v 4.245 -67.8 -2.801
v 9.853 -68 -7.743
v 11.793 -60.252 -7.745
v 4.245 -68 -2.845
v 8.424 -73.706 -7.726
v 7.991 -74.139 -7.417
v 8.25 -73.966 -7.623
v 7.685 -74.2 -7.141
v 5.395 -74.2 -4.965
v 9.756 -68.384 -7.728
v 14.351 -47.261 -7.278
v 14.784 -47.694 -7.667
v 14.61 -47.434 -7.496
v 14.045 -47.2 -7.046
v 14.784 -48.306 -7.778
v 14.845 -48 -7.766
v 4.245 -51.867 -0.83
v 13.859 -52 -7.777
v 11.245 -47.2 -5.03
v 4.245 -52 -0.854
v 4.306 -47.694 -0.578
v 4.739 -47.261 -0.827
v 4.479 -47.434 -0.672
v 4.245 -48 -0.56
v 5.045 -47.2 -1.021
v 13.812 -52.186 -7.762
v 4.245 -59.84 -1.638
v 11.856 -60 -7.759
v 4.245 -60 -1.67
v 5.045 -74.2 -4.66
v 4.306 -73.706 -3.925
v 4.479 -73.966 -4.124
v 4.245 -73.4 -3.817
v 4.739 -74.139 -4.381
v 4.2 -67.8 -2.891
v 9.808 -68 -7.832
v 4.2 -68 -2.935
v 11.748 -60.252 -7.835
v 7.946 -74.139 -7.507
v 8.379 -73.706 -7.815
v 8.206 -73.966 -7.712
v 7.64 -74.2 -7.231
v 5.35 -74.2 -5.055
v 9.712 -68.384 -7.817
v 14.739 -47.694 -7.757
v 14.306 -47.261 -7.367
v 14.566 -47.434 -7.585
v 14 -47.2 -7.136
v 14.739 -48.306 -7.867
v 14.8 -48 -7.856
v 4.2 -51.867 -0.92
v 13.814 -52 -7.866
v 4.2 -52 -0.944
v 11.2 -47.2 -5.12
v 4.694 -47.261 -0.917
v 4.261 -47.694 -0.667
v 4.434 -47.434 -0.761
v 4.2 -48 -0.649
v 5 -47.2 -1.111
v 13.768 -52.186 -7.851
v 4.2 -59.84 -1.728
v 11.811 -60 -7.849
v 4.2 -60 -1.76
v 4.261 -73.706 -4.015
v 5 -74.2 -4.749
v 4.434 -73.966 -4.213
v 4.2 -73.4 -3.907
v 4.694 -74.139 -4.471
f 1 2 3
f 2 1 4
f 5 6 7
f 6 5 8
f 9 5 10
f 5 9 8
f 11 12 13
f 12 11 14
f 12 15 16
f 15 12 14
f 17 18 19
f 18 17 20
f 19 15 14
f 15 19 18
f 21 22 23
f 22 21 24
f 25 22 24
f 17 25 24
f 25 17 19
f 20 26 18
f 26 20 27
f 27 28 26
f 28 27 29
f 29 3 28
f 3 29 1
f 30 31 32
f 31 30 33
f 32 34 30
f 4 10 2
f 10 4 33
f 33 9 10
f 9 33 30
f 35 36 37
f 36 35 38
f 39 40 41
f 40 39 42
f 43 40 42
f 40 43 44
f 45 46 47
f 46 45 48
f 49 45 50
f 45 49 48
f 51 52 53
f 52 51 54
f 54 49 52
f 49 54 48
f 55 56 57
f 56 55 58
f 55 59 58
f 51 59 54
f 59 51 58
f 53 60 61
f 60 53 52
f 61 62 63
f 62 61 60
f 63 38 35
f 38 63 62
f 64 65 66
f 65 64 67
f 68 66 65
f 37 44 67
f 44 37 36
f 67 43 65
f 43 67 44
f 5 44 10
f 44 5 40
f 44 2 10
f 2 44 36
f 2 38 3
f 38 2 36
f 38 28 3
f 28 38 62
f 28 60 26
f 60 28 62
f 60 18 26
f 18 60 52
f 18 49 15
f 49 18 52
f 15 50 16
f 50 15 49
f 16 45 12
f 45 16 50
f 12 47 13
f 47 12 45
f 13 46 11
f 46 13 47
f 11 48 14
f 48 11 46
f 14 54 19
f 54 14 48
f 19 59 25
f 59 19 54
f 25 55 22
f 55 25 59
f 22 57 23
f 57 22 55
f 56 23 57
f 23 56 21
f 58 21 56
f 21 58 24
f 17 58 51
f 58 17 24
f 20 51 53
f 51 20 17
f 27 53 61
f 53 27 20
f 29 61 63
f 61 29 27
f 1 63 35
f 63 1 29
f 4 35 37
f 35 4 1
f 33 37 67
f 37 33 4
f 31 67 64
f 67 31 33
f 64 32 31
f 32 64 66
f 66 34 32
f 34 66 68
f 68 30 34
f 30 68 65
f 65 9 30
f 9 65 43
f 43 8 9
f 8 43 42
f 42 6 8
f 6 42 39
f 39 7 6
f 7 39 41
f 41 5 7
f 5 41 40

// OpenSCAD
use <../lib.scad>
function ldraw_lib__4221407dc01() = [
// 0 Sticker  1.5 x  3.3 Trapezoid Yellow Left (Formed)
// 0 Name: 4221407dc01.dat
// 0 Author: Evert-Jan Boer [ejboer]
// 0 !LDRAW_ORG Part UPDATE 2024-08
// 0 !LICENSE Licensed under CC BY 4.0 : see CAreadme.txt
// 
// 0 BFC CERTIFY CCW
  [0,"BFC","CERTIFY"],
  [0,"BFC","CCW"],
// 
// 0 !KEYWORDS Set 10134, Star Wars, Y-Wing Starfighter
// 
// 0 !HISTORY 2024-09-30 [OrionP] Official Update 2024-08
// 
// 
// 4 14 10.612 7.1127 -170 24.6318 19.3566 -170 29.4819 19.3633 -150.6301 10.612 7.0035 -169.5
  [4,14,10.612,7.1127,-170,24.6318,19.3566,-170,29.4819,19.3633,-150.6301,10.612,7.0035,-169.5],
// 4 14 19.212 17.8523 -185.5 19.9774 18.5432 -185.3478 20.6262 19.0566 -184.9142 21.0598 19.3144 -184.2654
  [4,14,19.212,17.8523,-185.5,19.9774,18.5432,-185.3478,20.6262,19.0566,-184.9142,21.0598,19.3144,-184.2654],
// 4 14 21.0598 19.3144 -184.2654 24.3911 19.3194 -170.9612 13.487 12.4135 -185.5 19.212 17.8523 -185.5
  [4,14,21.0598,19.3144,-184.2654,24.3911,19.3194,-170.9612,13.487,12.4135,-185.5,19.212,17.8523,-185.5],
// 4 14 36.9598 19.1686 -119.2346 36.5262 18.7397 -118.5858 35.8774 18.1945 -118.1522 35.112 17.616 -118
  [4,14,36.9598,19.1686,-119.2346,36.5262,18.7397,-118.5858,35.8774,18.1945,-118.1522,35.112,17.616,-118],
// 4 14 36.9598 19.1686 -119.2346 35.112 17.616 -118 36.9598 19.4442 -120.7654 37.112 19.416 -120
  [4,14,36.9598,19.1686,-119.2346,35.112,17.616,-118,36.9598,19.4442,-120.7654,37.112,19.416,-120],
// 4 14 34.6475 19.4416 -130 28.112 12.576 -118 10.612 2.076 -129.6667 10.612 2.136 -130
  [4,14,34.6475,19.4416,-130,28.112,12.576,-118,10.612,2.076,-129.6667,10.612,2.136,-130],
// 4 14 36.9598 19.4442 -120.7654 35.112 17.616 -118 28.112 12.576 -118 34.6475 19.4416 -130
  [4,14,36.9598,19.4442,-120.7654,35.112,17.616,-118,28.112,12.576,-118,34.6475,19.4416,-130],
// 4 14 10.7642 1.4442 -119.2346 10.612 1.3993 -120 11.8466 2.0684 -118.1522 11.1978 1.6792 -118.5858
  [4,14,10.7642,1.4442,-119.2346,10.612,1.3993,-120,11.8466,2.0684,-118.1522,11.1978,1.6792,-118.5858],
// 3 14 12.612 2.5527 -118 11.8466 2.0684 -118.1522 10.612 1.3993 -120
  [3,14,12.612,2.5527,-118,11.8466,2.0684,-118.1522,10.612,1.3993,-120],
// 4 14 10.612 1.3993 -120 10.612 2.076 -129.6667 28.112 12.576 -118 12.612 2.5527 -118
  [4,14,10.612,1.3993,-120,10.612,2.076,-129.6667,28.112,12.576,-118,12.612,2.5527,-118],
// 4 14 10.612 4.096 -149.6 34.5312 19.4043 -130.4647 34.6475 19.4416 -130 10.612 2.136 -130
  [4,14,10.612,4.096,-149.6,34.5312,19.4043,-130.4647,34.6475,19.4416,-130,10.612,2.136,-130],
// 4 14 10.612 4.176 -150 29.6396 19.3981 -150 34.5312 19.4043 -130.4647 10.612 4.096 -149.6
  [4,14,10.612,4.176,-150,29.6396,19.3981,-150,34.5312,19.4043,-130.4647,10.612,4.096,-149.6],
// 4 14 10.612 7.0035 -169.5 29.4819 19.3633 -150.6301 29.6396 19.3981 -150 10.612 4.176 -150
  [4,14,10.612,7.0035,-169.5,29.4819,19.3633,-150.6301,29.6396,19.3981,-150,10.612,4.176,-150],
// 4 14 12.612 11.6493 -185.5 10.612 9.5427 -183.5 10.7642 9.8134 -184.2654 11.1978 10.3088 -184.9142
  [4,14,12.612,11.6493,-185.5,10.612,9.5427,-183.5,10.7642,9.8134,-184.2654,11.1978,10.3088,-184.9142],
// 3 14 11.1978 10.3088 -184.9142 11.8466 10.9535 -185.3478 12.612 11.6493 -185.5
  [3,14,11.1978,10.3088,-184.9142,11.8466,10.9535,-185.3478,12.612,11.6493,-185.5],
// 4 14 24.6318 19.3566 -170 10.612 7.1127 -170 10.612 9.5427 -183.5 24.3911 19.3194 -170.9612
  [4,14,24.6318,19.3566,-170,10.612,7.1127,-170,10.612,9.5427,-183.5,24.3911,19.3194,-170.9612],
// 4 14 13.487 12.4135 -185.5 24.3911 19.3194 -170.9612 10.612 9.5427 -183.5 12.612 11.6493 -185.5
  [4,14,13.487,12.4135,-185.5,24.3911,19.3194,-170.9612,10.612,9.5427,-183.5,12.612,11.6493,-185.5],
// 
// 4 16 29.3699 19.5873 -150.6301 24.5198 19.5806 -170 10.5 7.3367 -170 10.5 7.2275 -169.5
  [4,16,29.3699,19.5873,-150.6301,24.5198,19.5806,-170,10.5,7.3367,-170,10.5,7.2275,-169.5],
// 4 16 20.5142 19.2806 -184.9142 19.8654 18.7672 -185.3478 19.1 18.0763 -185.5 20.9478 19.5384 -184.2654
  [4,16,20.5142,19.2806,-184.9142,19.8654,18.7672,-185.3478,19.1,18.0763,-185.5,20.9478,19.5384,-184.2654],
// 4 16 13.375 12.6375 -185.5 24.2791 19.5434 -170.9612 20.9478 19.5384 -184.2654 19.1 18.0763 -185.5
  [4,16,13.375,12.6375,-185.5,24.2791,19.5434,-170.9612,20.9478,19.5384,-184.2654,19.1,18.0763,-185.5],
// 4 16 35.7654 18.4185 -118.1522 36.4142 18.9637 -118.5858 36.8478 19.3926 -119.2346 35 17.84 -118
  [4,16,35.7654,18.4185,-118.1522,36.4142,18.9637,-118.5858,36.8478,19.3926,-119.2346,35,17.84,-118],
// 4 16 36.8478 19.6682 -120.7654 35 17.84 -118 36.8478 19.3926 -119.2346 37 19.64 -120
  [4,16,36.8478,19.6682,-120.7654,35,17.84,-118,36.8478,19.3926,-119.2346,37,19.64,-120],
// 4 16 10.5 2.3 -129.6667 28 12.8 -118 34.5355 19.6656 -130 10.5 2.36 -130
  [4,16,10.5,2.3,-129.6667,28,12.8,-118,34.5355,19.6656,-130,10.5,2.36,-130],
// 4 16 28 12.8 -118 35 17.84 -118 36.8478 19.6682 -120.7654 34.5355 19.6656 -130
  [4,16,28,12.8,-118,35,17.84,-118,36.8478,19.6682,-120.7654,34.5355,19.6656,-130],
// 4 16 11.7346 2.2924 -118.1522 10.5 1.6233 -120 10.6522 1.6682 -119.2346 11.0858 1.9032 -118.5858
  [4,16,11.7346,2.2924,-118.1522,10.5,1.6233,-120,10.6522,1.6682,-119.2346,11.0858,1.9032,-118.5858],
// 3 16 11.7346 2.2924 -118.1522 12.5 2.7767 -118 10.5 1.6233 -120
  [3,16,11.7346,2.2924,-118.1522,12.5,2.7767,-118,10.5,1.6233,-120],
// 4 16 28 12.8 -118 10.5 2.3 -129.6667 10.5 1.6233 -120 12.5 2.7767 -118
  [4,16,28,12.8,-118,10.5,2.3,-129.6667,10.5,1.6233,-120,12.5,2.7767,-118],
// 4 16 34.5355 19.6656 -130 34.4192 19.6283 -130.4647 10.5 4.32 -149.6 10.5 2.36 -130
  [4,16,34.5355,19.6656,-130,34.4192,19.6283,-130.4647,10.5,4.32,-149.6,10.5,2.36,-130],
// 4 16 34.4192 19.6283 -130.4647 29.5276 19.6221 -150 10.5 4.4 -150 10.5 4.32 -149.6
  [4,16,34.4192,19.6283,-130.4647,29.5276,19.6221,-150,10.5,4.4,-150,10.5,4.32,-149.6],
// 4 16 29.5276 19.6221 -150 29.3699 19.5873 -150.6301 10.5 7.2275 -169.5 10.5 4.4 -150
  [4,16,29.5276,19.6221,-150,29.3699,19.5873,-150.6301,10.5,7.2275,-169.5,10.5,4.4,-150],
// 4 16 10.6522 10.0374 -184.2654 10.5 9.7667 -183.5 12.5 11.8733 -185.5 11.0858 10.5328 -184.9142
  [4,16,10.6522,10.0374,-184.2654,10.5,9.7667,-183.5,12.5,11.8733,-185.5,11.0858,10.5328,-184.9142],
// 3 16 11.7346 11.1775 -185.3478 11.0858 10.5328 -184.9142 12.5 11.8733 -185.5
  [3,16,11.7346,11.1775,-185.3478,11.0858,10.5328,-184.9142,12.5,11.8733,-185.5],
// 4 16 10.5 9.7667 -183.5 10.5 7.3367 -170 24.5198 19.5806 -170 24.2791 19.5434 -170.9612
  [4,16,10.5,9.7667,-183.5,10.5,7.3367,-170,24.5198,19.5806,-170,24.2791,19.5434,-170.9612],
// 4 16 10.5 9.7667 -183.5 24.2791 19.5434 -170.9612 13.375 12.6375 -185.5 12.5 11.8733 -185.5
  [4,16,10.5,9.7667,-183.5,24.2791,19.5434,-170.9612,13.375,12.6375,-185.5,12.5,11.8733,-185.5],
// 4 16 21.0598 19.3144 -184.2654 20.9478 19.5384 -184.2654 24.2791 19.5434 -170.9612 24.3911 19.3194 -170.9612
  [4,16,21.0598,19.3144,-184.2654,20.9478,19.5384,-184.2654,24.2791,19.5434,-170.9612,24.3911,19.3194,-170.9612],
// 4 16 24.3911 19.3194 -170.9612 24.2791 19.5434 -170.9612 24.5198 19.5806 -170 24.6318 19.3566 -170
  [4,16,24.3911,19.3194,-170.9612,24.2791,19.5434,-170.9612,24.5198,19.5806,-170,24.6318,19.3566,-170],
// 4 16 24.6318 19.3566 -170 24.5198 19.5806 -170 29.3699 19.5873 -150.6301 29.4819 19.3633 -150.6301
  [4,16,24.6318,19.3566,-170,24.5198,19.5806,-170,29.3699,19.5873,-150.6301,29.4819,19.3633,-150.6301],
// 4 16 29.4819 19.3633 -150.6301 29.3699 19.5873 -150.6301 29.5276 19.6221 -150 29.6396 19.3981 -150
  [4,16,29.4819,19.3633,-150.6301,29.3699,19.5873,-150.6301,29.5276,19.6221,-150,29.6396,19.3981,-150],
// 4 16 29.6396 19.3981 -150 29.5276 19.6221 -150 34.4192 19.6283 -130.4647 34.5312 19.4043 -130.4647
  [4,16,29.6396,19.3981,-150,29.5276,19.6221,-150,34.4192,19.6283,-130.4647,34.5312,19.4043,-130.4647],
// 4 16 34.5312 19.4043 -130.4647 34.4192 19.6283 -130.4647 34.5355 19.6656 -130 34.6475 19.4416 -130
  [4,16,34.5312,19.4043,-130.4647,34.4192,19.6283,-130.4647,34.5355,19.6656,-130,34.6475,19.4416,-130],
// 4 16 34.6475 19.4416 -130 34.5355 19.6656 -130 36.8478 19.6682 -120.7654 36.9598 19.4442 -120.7654
  [4,16,34.6475,19.4416,-130,34.5355,19.6656,-130,36.8478,19.6682,-120.7654,36.9598,19.4442,-120.7654],
// 4 16 36.9598 19.4442 -120.7654 36.8478 19.6682 -120.7654 37 19.64 -120 37.112 19.416 -120
  [4,16,36.9598,19.4442,-120.7654,36.8478,19.6682,-120.7654,37,19.64,-120,37.112,19.416,-120],
// 4 16 37 19.64 -120 36.8478 19.3926 -119.2346 36.9598 19.1686 -119.2346 37.112 19.416 -120
  [4,16,37,19.64,-120,36.8478,19.3926,-119.2346,36.9598,19.1686,-119.2346,37.112,19.416,-120],
// 4 16 36.8478 19.3926 -119.2346 36.4142 18.9637 -118.5858 36.5262 18.7397 -118.5858 36.9598 19.1686 -119.2346
  [4,16,36.8478,19.3926,-119.2346,36.4142,18.9637,-118.5858,36.5262,18.7397,-118.5858,36.9598,19.1686,-119.2346],
// 4 16 36.4142 18.9637 -118.5858 35.7654 18.4185 -118.1522 35.8774 18.1945 -118.1522 36.5262 18.7397 -118.5858
  [4,16,36.4142,18.9637,-118.5858,35.7654,18.4185,-118.1522,35.8774,18.1945,-118.1522,36.5262,18.7397,-118.5858],
// 4 16 35.7654 18.4185 -118.1522 35 17.84 -118 35.112 17.616 -118 35.8774 18.1945 -118.1522
  [4,16,35.7654,18.4185,-118.1522,35,17.84,-118,35.112,17.616,-118,35.8774,18.1945,-118.1522],
// 4 16 35 17.84 -118 28 12.8 -118 28.112 12.576 -118 35.112 17.616 -118
  [4,16,35,17.84,-118,28,12.8,-118,28.112,12.576,-118,35.112,17.616,-118],
// 4 16 28 12.8 -118 12.5 2.7767 -118 12.612 2.5527 -118 28.112 12.576 -118
  [4,16,28,12.8,-118,12.5,2.7767,-118,12.612,2.5527,-118,28.112,12.576,-118],
// 4 16 12.5 2.7767 -118 11.7346 2.2924 -118.1522 11.8466 2.0684 -118.1522 12.612 2.5527 -118
  [4,16,12.5,2.7767,-118,11.7346,2.2924,-118.1522,11.8466,2.0684,-118.1522,12.612,2.5527,-118],
// 4 16 11.7346 2.2924 -118.1522 11.0858 1.9032 -118.5858 11.1978 1.6792 -118.5858 11.8466 2.0684 -118.1522
  [4,16,11.7346,2.2924,-118.1522,11.0858,1.9032,-118.5858,11.1978,1.6792,-118.5858,11.8466,2.0684,-118.1522],
// 4 16 11.0858 1.9032 -118.5858 10.6522 1.6682 -119.2346 10.7642 1.4442 -119.2346 11.1978 1.6792 -118.5858
  [4,16,11.0858,1.9032,-118.5858,10.6522,1.6682,-119.2346,10.7642,1.4442,-119.2346,11.1978,1.6792,-118.5858],
// 4 16 10.6522 1.6682 -119.2346 10.5 1.6233 -120 10.612 1.3993 -120 10.7642 1.4442 -119.2346
  [4,16,10.6522,1.6682,-119.2346,10.5,1.6233,-120,10.612,1.3993,-120,10.7642,1.4442,-119.2346],
// 4 16 10.612 1.3993 -120 10.5 1.6233 -120 10.5 2.3 -129.6667 10.612 2.076 -129.6667
  [4,16,10.612,1.3993,-120,10.5,1.6233,-120,10.5,2.3,-129.6667,10.612,2.076,-129.6667],
// 4 16 10.612 2.076 -129.6667 10.5 2.3 -129.6667 10.5 2.36 -130 10.612 2.136 -130
  [4,16,10.612,2.076,-129.6667,10.5,2.3,-129.6667,10.5,2.36,-130,10.612,2.136,-130],
// 4 16 10.612 2.136 -130 10.5 2.36 -130 10.5 4.32 -149.6 10.612 4.096 -149.6
  [4,16,10.612,2.136,-130,10.5,2.36,-130,10.5,4.32,-149.6,10.612,4.096,-149.6],
// 4 16 10.612 4.096 -149.6 10.5 4.32 -149.6 10.5 4.4 -150 10.612 4.176 -150
  [4,16,10.612,4.096,-149.6,10.5,4.32,-149.6,10.5,4.4,-150,10.612,4.176,-150],
// 4 16 10.612 4.176 -150 10.5 4.4 -150 10.5 7.2275 -169.5 10.612 7.0035 -169.5
  [4,16,10.612,4.176,-150,10.5,4.4,-150,10.5,7.2275,-169.5,10.612,7.0035,-169.5],
// 4 16 10.612 7.0035 -169.5 10.5 7.2275 -169.5 10.5 7.3367 -170 10.612 7.1127 -170
  [4,16,10.612,7.0035,-169.5,10.5,7.2275,-169.5,10.5,7.3367,-170,10.612,7.1127,-170],
// 4 16 10.612 7.1127 -170 10.5 7.3367 -170 10.5 9.7667 -183.5 10.612 9.5427 -183.5
  [4,16,10.612,7.1127,-170,10.5,7.3367,-170,10.5,9.7667,-183.5,10.612,9.5427,-183.5],
// 4 16 10.612 9.5427 -183.5 10.5 9.7667 -183.5 10.6522 10.0374 -184.2654 10.7642 9.8134 -184.2654
  [4,16,10.612,9.5427,-183.5,10.5,9.7667,-183.5,10.6522,10.0374,-184.2654,10.7642,9.8134,-184.2654],
// 4 16 10.7642 9.8134 -184.2654 10.6522 10.0374 -184.2654 11.0858 10.5328 -184.9142 11.1978 10.3088 -184.9142
  [4,16,10.7642,9.8134,-184.2654,10.6522,10.0374,-184.2654,11.0858,10.5328,-184.9142,11.1978,10.3088,-184.9142],
// 4 16 11.1978 10.3088 -184.9142 11.0858 10.5328 -184.9142 11.7346 11.1775 -185.3478 11.8466 10.9535 -185.3478
  [4,16,11.1978,10.3088,-184.9142,11.0858,10.5328,-184.9142,11.7346,11.1775,-185.3478,11.8466,10.9535,-185.3478],
// 4 16 11.8466 10.9535 -185.3478 11.7346 11.1775 -185.3478 12.5 11.8733 -185.5 12.612 11.6493 -185.5
  [4,16,11.8466,10.9535,-185.3478,11.7346,11.1775,-185.3478,12.5,11.8733,-185.5,12.612,11.6493,-185.5],
// 4 16 12.612 11.6493 -185.5 12.5 11.8733 -185.5 13.375 12.6375 -185.5 13.487 12.4135 -185.5
  [4,16,12.612,11.6493,-185.5,12.5,11.8733,-185.5,13.375,12.6375,-185.5,13.487,12.4135,-185.5],
// 4 16 13.487 12.4135 -185.5 13.375 12.6375 -185.5 19.1 18.0763 -185.5 19.212 17.8523 -185.5
  [4,16,13.487,12.4135,-185.5,13.375,12.6375,-185.5,19.1,18.0763,-185.5,19.212,17.8523,-185.5],
// 4 16 19.212 17.8523 -185.5 19.1 18.0763 -185.5 19.8654 18.7672 -185.3478 19.9774 18.5432 -185.3478
  [4,16,19.212,17.8523,-185.5,19.1,18.0763,-185.5,19.8654,18.7672,-185.3478,19.9774,18.5432,-185.3478],
// 4 16 19.9774 18.5432 -185.3478 19.8654 18.7672 -185.3478 20.5142 19.2806 -184.9142 20.6262 19.0566 -184.9142
  [4,16,19.9774,18.5432,-185.3478,19.8654,18.7672,-185.3478,20.5142,19.2806,-184.9142,20.6262,19.0566,-184.9142],
// 4 16 20.6262 19.0566 -184.9142 20.5142 19.2806 -184.9142 20.9478 19.5384 -184.2654 21.0598 19.3144 -184.2654
  [4,16,20.6262,19.0566,-184.9142,20.5142,19.2806,-184.9142,20.9478,19.5384,-184.2654,21.0598,19.3144,-184.2654],
// 
// 5 24 10.6522 1.6682 -119.2346 10.7642 1.4442 -119.2346 11.1978 1.6792 -118.5858 10.5 1.6233 -120
  [5,24,10.6522,1.6682,-119.2346,10.7642,1.4442,-119.2346,11.1978,1.6792,-118.5858,10.5,1.6233,-120],
// 5 24 24.5198 19.5806 -170 24.6318 19.3566 -170 24.3911 19.3194 -170.9612 29.3699 19.5873 -150.6301
  [5,24,24.5198,19.5806,-170,24.6318,19.3566,-170,24.3911,19.3194,-170.9612,29.3699,19.5873,-150.6301],
// 5 24 13.375 12.6375 -185.5 24.2791 19.5434 -170.9612 12.5 11.8733 -185.5 20.9478 19.5384 -184.2654
  [5,24,13.375,12.6375,-185.5,24.2791,19.5434,-170.9612,12.5,11.8733,-185.5,20.9478,19.5384,-184.2654],
// 5 24 12.5 2.7767 -118 12.612 2.5527 -118 28.112 12.576 -118 11.7346 2.2924 -118.1522
  [5,24,12.5,2.7767,-118,12.612,2.5527,-118,28.112,12.576,-118,11.7346,2.2924,-118.1522],
// 5 24 29.5276 19.6221 -150 10.5 4.4 -150 10.5 4.32 -149.6 29.3699 19.5873 -150.6301
  [5,24,29.5276,19.6221,-150,10.5,4.4,-150,10.5,4.32,-149.6,29.3699,19.5873,-150.6301],
// 5 24 12.612 11.6493 -185.5 12.5 11.8733 -185.5 11.8466 10.9535 -185.3478 13.375 12.6375 -185.5
  [5,24,12.612,11.6493,-185.5,12.5,11.8733,-185.5,11.8466,10.9535,-185.3478,13.375,12.6375,-185.5],
// 5 24 10.612 4.176 -150 29.6396 19.3981 -150 10.612 7.0035 -169.5 34.5312 19.4043 -130.4647
  [5,24,10.612,4.176,-150,29.6396,19.3981,-150,10.612,7.0035,-169.5,34.5312,19.4043,-130.4647],
// 5 24 29.4819 19.3633 -150.6301 10.612 7.0035 -169.5 29.6396 19.3981 -150 10.612 7.1127 -170
  [5,24,29.4819,19.3633,-150.6301,10.612,7.0035,-169.5,29.6396,19.3981,-150,10.612,7.1127,-170],
// 5 24 19.8654 18.7672 -185.3478 19.9774 18.5432 -185.3478 19.212 17.8523 -185.5 20.5142 19.2806 -184.9142
  [5,24,19.8654,18.7672,-185.3478,19.9774,18.5432,-185.3478,19.212,17.8523,-185.5,20.5142,19.2806,-184.9142],
// 5 24 10.612 4.096 -149.6 10.5 4.32 -149.6 10.5 4.4 -150 10.612 2.136 -130
  [5,24,10.612,4.096,-149.6,10.5,4.32,-149.6,10.5,4.4,-150,10.612,2.136,-130],
// 5 24 10.5 7.2275 -169.5 29.3699 19.5873 -150.6301 10.5 4.4 -150 24.5198 19.5806 -170
  [5,24,10.5,7.2275,-169.5,29.3699,19.5873,-150.6301,10.5,4.4,-150,24.5198,19.5806,-170],
// 5 24 11.7346 2.2924 -118.1522 11.8466 2.0684 -118.1522 12.612 2.5527 -118 11.0858 1.9032 -118.5858
  [5,24,11.7346,2.2924,-118.1522,11.8466,2.0684,-118.1522,12.612,2.5527,-118,11.0858,1.9032,-118.5858],
// 5 24 19.1 18.0763 -185.5 19.212 17.8523 -185.5 13.487 12.4135 -185.5 19.8654 18.7672 -185.3478
  [5,24,19.1,18.0763,-185.5,19.212,17.8523,-185.5,13.487,12.4135,-185.5,19.8654,18.7672,-185.3478],
// 5 24 10.5 9.7667 -183.5 10.612 9.5427 -183.5 10.612 7.1127 -170 10.6522 10.0374 -184.2654
  [5,24,10.5,9.7667,-183.5,10.612,9.5427,-183.5,10.612,7.1127,-170,10.6522,10.0374,-184.2654],
// 5 24 24.2791 19.5434 -170.9612 24.3911 19.3194 -170.9612 21.0598 19.3144 -184.2654 24.5198 19.5806 -170
  [5,24,24.2791,19.5434,-170.9612,24.3911,19.3194,-170.9612,21.0598,19.3144,-184.2654,24.5198,19.5806,-170],
// 5 24 11.7346 11.1775 -185.3478 11.8466 10.9535 -185.3478 11.1978 10.3088 -184.9142 12.5 11.8733 -185.5
  [5,24,11.7346,11.1775,-185.3478,11.8466,10.9535,-185.3478,11.1978,10.3088,-184.9142,12.5,11.8733,-185.5],
// 5 24 28 12.8 -118 10.5 2.3 -129.6667 34.5355 19.6656 -130 10.5 1.6233 -120
  [5,24,28,12.8,-118,10.5,2.3,-129.6667,34.5355,19.6656,-130,10.5,1.6233,-120],
// 5 24 29.5276 19.6221 -150 29.6396 19.3981 -150 34.4192 19.6283 -130.4647 29.4819 19.3633 -150.6301
  [5,24,29.5276,19.6221,-150,29.6396,19.3981,-150,34.4192,19.6283,-130.4647,29.4819,19.3633,-150.6301],
// 5 24 11.0858 1.9032 -118.5858 11.1978 1.6792 -118.5858 11.8466 2.0684 -118.1522 10.6522 1.6682 -119.2346
  [5,24,11.0858,1.9032,-118.5858,11.1978,1.6792,-118.5858,11.8466,2.0684,-118.1522,10.6522,1.6682,-119.2346],
// 5 24 36.4142 18.9637 -118.5858 36.5262 18.7397 -118.5858 36.9598 19.1686 -119.2346 35.7654 18.4185 -118.1522
  [5,24,36.4142,18.9637,-118.5858,36.5262,18.7397,-118.5858,36.9598,19.1686,-119.2346,35.7654,18.4185,-118.1522],
// 5 24 34.5312 19.4043 -130.4647 34.4192 19.6283 -130.4647 34.5355 19.6656 -130 29.6396 19.3981 -150
  [5,24,34.5312,19.4043,-130.4647,34.4192,19.6283,-130.4647,34.5355,19.6656,-130,29.6396,19.3981,-150],
// 5 24 24.3911 19.3194 -170.9612 13.487 12.4135 -185.5 10.612 9.5427 -183.5 19.212 17.8523 -185.5
  [5,24,24.3911,19.3194,-170.9612,13.487,12.4135,-185.5,10.612,9.5427,-183.5,19.212,17.8523,-185.5],
// 5 24 10.6522 10.0374 -184.2654 10.7642 9.8134 -184.2654 10.612 9.5427 -183.5 11.0858 10.5328 -184.9142
  [5,24,10.6522,10.0374,-184.2654,10.7642,9.8134,-184.2654,10.612,9.5427,-183.5,11.0858,10.5328,-184.9142],
// 5 24 29.3699 19.5873 -150.6301 29.4819 19.3633 -150.6301 24.6318 19.3566 -170 29.5276 19.6221 -150
  [5,24,29.3699,19.5873,-150.6301,29.4819,19.3633,-150.6301,24.6318,19.3566,-170,29.5276,19.6221,-150],
// 5 24 35 17.84 -118 35.112 17.616 -118 35.8774 18.1945 -118.1522 28 12.8 -118
  [5,24,35,17.84,-118,35.112,17.616,-118,35.8774,18.1945,-118.1522,28,12.8,-118],
// 5 24 10.5 1.6233 -120 10.612 1.3993 -120 10.7642 1.4442 -119.2346 10.5 2.3 -129.6667
  [5,24,10.5,1.6233,-120,10.612,1.3993,-120,10.7642,1.4442,-119.2346,10.5,2.3,-129.6667],
// 5 24 24.5198 19.5806 -170 10.5 7.3367 -170 24.2791 19.5434 -170.9612 10.5 7.2275 -169.5
  [5,24,24.5198,19.5806,-170,10.5,7.3367,-170,24.2791,19.5434,-170.9612,10.5,7.2275,-169.5],
// 5 24 10.5 2.3 -129.6667 10.612 2.076 -129.6667 10.612 1.3993 -120 10.5 2.36 -130
  [5,24,10.5,2.3,-129.6667,10.612,2.076,-129.6667,10.612,1.3993,-120,10.5,2.36,-130],
// 5 24 10.5 7.2275 -169.5 10.612 7.0035 -169.5 10.612 4.176 -150 10.5 7.3367 -170
  [5,24,10.5,7.2275,-169.5,10.612,7.0035,-169.5,10.612,4.176,-150,10.5,7.3367,-170],
// 5 24 34.6475 19.4416 -130 10.612 2.136 -130 10.612 4.096 -149.6 28.112 12.576 -118
  [5,24,34.6475,19.4416,-130,10.612,2.136,-130,10.612,4.096,-149.6,28.112,12.576,-118],
// 5 24 10.5 7.3367 -170 10.612 7.1127 -170 10.612 7.0035 -169.5 10.5 9.7667 -183.5
  [5,24,10.5,7.3367,-170,10.612,7.1127,-170,10.612,7.0035,-169.5,10.5,9.7667,-183.5],
// 5 24 10.612 2.076 -129.6667 28.112 12.576 -118 12.612 2.5527 -118 10.612 2.136 -130
  [5,24,10.612,2.076,-129.6667,28.112,12.576,-118,12.612,2.5527,-118,10.612,2.136,-130],
// 5 24 35.7654 18.4185 -118.1522 35.8774 18.1945 -118.1522 36.5262 18.7397 -118.5858 35 17.84 -118
  [5,24,35.7654,18.4185,-118.1522,35.8774,18.1945,-118.1522,36.5262,18.7397,-118.5858,35,17.84,-118],
// 5 24 34.5355 19.6656 -130 10.5 2.36 -130 34.4192 19.6283 -130.4647 10.5 2.3 -129.6667
  [5,24,34.5355,19.6656,-130,10.5,2.36,-130,34.4192,19.6283,-130.4647,10.5,2.3,-129.6667],
// 5 24 20.5142 19.2806 -184.9142 20.6262 19.0566 -184.9142 19.9774 18.5432 -185.3478 20.9478 19.5384 -184.2654
  [5,24,20.5142,19.2806,-184.9142,20.6262,19.0566,-184.9142,19.9774,18.5432,-185.3478,20.9478,19.5384,-184.2654],
// 5 24 10.612 4.096 -149.6 34.5312 19.4043 -130.4647 10.612 4.176 -150 34.6475 19.4416 -130
  [5,24,10.612,4.096,-149.6,34.5312,19.4043,-130.4647,10.612,4.176,-150,34.6475,19.4416,-130],
// 5 24 11.0858 10.5328 -184.9142 11.1978 10.3088 -184.9142 10.7642 9.8134 -184.2654 11.7346 11.1775 -185.3478
  [5,24,11.0858,10.5328,-184.9142,11.1978,10.3088,-184.9142,10.7642,9.8134,-184.2654,11.7346,11.1775,-185.3478],
// 5 24 37 19.64 -120 37.112 19.416 -120 36.9598 19.4442 -120.7654 36.8478 19.3926 -119.2346
  [5,24,37,19.64,-120,37.112,19.416,-120,36.9598,19.4442,-120.7654,36.8478,19.3926,-119.2346],
// 5 24 36.8478 19.3926 -119.2346 36.9598 19.1686 -119.2346 37.112 19.416 -120 36.4142 18.9637 -118.5858
  [5,24,36.8478,19.3926,-119.2346,36.9598,19.1686,-119.2346,37.112,19.416,-120,36.4142,18.9637,-118.5858],
// 5 24 10.612 7.1127 -170 24.6318 19.3566 -170 10.612 9.5427 -183.5 29.4819 19.3633 -150.6301
  [5,24,10.612,7.1127,-170,24.6318,19.3566,-170,10.612,9.5427,-183.5,29.4819,19.3633,-150.6301],
// 5 24 21.0598 19.3144 -184.2654 20.9478 19.5384 -184.2654 20.6262 19.0566 -184.9142 24.2791 19.5434 -170.9612
  [5,24,21.0598,19.3144,-184.2654,20.9478,19.5384,-184.2654,20.6262,19.0566,-184.9142,24.2791,19.5434,-170.9612],
// 5 24 10.5 2.36 -130 10.612 2.136 -130 10.5 4.32 -149.6 10.612 2.076 -129.6667
  [5,24,10.5,2.36,-130,10.612,2.136,-130,10.5,4.32,-149.6,10.612,2.076,-129.6667],
// 5 24 34.4192 19.6283 -130.4647 10.5 4.32 -149.6 10.5 2.36 -130 29.5276 19.6221 -150
  [5,24,34.4192,19.6283,-130.4647,10.5,4.32,-149.6,10.5,2.36,-130,29.5276,19.6221,-150],
// 5 24 10.5 4.4 -150 10.612 4.176 -150 10.612 4.096 -149.6 10.5 7.2275 -169.5
  [5,24,10.5,4.4,-150,10.612,4.176,-150,10.612,4.096,-149.6,10.5,7.2275,-169.5],
// 5 24 34.5355 19.6656 -130 34.6475 19.4416 -130 34.5312 19.4043 -130.4647 36.8478 19.6682 -120.7654
  [5,24,34.5355,19.6656,-130,34.6475,19.4416,-130,34.5312,19.4043,-130.4647,36.8478,19.6682,-120.7654],
// 5 24 36.8478 19.6682 -120.7654 36.9598 19.4442 -120.7654 34.6475 19.4416 -130 37 19.64 -120
  [5,24,36.8478,19.6682,-120.7654,36.9598,19.4442,-120.7654,34.6475,19.4416,-130,37,19.64,-120],
];
module ldraw_lib__4221407dc01(step=0, col=false, unit=2/5, alt=false, line=0.2, solid=!$preview)
    makepoly(ldraw_lib__4221407dc01(), step=step, col=col, unit=unit, alt=alt, line=line, solid=solid);
ldraw_lib__4221407dc01(line=0.2);
